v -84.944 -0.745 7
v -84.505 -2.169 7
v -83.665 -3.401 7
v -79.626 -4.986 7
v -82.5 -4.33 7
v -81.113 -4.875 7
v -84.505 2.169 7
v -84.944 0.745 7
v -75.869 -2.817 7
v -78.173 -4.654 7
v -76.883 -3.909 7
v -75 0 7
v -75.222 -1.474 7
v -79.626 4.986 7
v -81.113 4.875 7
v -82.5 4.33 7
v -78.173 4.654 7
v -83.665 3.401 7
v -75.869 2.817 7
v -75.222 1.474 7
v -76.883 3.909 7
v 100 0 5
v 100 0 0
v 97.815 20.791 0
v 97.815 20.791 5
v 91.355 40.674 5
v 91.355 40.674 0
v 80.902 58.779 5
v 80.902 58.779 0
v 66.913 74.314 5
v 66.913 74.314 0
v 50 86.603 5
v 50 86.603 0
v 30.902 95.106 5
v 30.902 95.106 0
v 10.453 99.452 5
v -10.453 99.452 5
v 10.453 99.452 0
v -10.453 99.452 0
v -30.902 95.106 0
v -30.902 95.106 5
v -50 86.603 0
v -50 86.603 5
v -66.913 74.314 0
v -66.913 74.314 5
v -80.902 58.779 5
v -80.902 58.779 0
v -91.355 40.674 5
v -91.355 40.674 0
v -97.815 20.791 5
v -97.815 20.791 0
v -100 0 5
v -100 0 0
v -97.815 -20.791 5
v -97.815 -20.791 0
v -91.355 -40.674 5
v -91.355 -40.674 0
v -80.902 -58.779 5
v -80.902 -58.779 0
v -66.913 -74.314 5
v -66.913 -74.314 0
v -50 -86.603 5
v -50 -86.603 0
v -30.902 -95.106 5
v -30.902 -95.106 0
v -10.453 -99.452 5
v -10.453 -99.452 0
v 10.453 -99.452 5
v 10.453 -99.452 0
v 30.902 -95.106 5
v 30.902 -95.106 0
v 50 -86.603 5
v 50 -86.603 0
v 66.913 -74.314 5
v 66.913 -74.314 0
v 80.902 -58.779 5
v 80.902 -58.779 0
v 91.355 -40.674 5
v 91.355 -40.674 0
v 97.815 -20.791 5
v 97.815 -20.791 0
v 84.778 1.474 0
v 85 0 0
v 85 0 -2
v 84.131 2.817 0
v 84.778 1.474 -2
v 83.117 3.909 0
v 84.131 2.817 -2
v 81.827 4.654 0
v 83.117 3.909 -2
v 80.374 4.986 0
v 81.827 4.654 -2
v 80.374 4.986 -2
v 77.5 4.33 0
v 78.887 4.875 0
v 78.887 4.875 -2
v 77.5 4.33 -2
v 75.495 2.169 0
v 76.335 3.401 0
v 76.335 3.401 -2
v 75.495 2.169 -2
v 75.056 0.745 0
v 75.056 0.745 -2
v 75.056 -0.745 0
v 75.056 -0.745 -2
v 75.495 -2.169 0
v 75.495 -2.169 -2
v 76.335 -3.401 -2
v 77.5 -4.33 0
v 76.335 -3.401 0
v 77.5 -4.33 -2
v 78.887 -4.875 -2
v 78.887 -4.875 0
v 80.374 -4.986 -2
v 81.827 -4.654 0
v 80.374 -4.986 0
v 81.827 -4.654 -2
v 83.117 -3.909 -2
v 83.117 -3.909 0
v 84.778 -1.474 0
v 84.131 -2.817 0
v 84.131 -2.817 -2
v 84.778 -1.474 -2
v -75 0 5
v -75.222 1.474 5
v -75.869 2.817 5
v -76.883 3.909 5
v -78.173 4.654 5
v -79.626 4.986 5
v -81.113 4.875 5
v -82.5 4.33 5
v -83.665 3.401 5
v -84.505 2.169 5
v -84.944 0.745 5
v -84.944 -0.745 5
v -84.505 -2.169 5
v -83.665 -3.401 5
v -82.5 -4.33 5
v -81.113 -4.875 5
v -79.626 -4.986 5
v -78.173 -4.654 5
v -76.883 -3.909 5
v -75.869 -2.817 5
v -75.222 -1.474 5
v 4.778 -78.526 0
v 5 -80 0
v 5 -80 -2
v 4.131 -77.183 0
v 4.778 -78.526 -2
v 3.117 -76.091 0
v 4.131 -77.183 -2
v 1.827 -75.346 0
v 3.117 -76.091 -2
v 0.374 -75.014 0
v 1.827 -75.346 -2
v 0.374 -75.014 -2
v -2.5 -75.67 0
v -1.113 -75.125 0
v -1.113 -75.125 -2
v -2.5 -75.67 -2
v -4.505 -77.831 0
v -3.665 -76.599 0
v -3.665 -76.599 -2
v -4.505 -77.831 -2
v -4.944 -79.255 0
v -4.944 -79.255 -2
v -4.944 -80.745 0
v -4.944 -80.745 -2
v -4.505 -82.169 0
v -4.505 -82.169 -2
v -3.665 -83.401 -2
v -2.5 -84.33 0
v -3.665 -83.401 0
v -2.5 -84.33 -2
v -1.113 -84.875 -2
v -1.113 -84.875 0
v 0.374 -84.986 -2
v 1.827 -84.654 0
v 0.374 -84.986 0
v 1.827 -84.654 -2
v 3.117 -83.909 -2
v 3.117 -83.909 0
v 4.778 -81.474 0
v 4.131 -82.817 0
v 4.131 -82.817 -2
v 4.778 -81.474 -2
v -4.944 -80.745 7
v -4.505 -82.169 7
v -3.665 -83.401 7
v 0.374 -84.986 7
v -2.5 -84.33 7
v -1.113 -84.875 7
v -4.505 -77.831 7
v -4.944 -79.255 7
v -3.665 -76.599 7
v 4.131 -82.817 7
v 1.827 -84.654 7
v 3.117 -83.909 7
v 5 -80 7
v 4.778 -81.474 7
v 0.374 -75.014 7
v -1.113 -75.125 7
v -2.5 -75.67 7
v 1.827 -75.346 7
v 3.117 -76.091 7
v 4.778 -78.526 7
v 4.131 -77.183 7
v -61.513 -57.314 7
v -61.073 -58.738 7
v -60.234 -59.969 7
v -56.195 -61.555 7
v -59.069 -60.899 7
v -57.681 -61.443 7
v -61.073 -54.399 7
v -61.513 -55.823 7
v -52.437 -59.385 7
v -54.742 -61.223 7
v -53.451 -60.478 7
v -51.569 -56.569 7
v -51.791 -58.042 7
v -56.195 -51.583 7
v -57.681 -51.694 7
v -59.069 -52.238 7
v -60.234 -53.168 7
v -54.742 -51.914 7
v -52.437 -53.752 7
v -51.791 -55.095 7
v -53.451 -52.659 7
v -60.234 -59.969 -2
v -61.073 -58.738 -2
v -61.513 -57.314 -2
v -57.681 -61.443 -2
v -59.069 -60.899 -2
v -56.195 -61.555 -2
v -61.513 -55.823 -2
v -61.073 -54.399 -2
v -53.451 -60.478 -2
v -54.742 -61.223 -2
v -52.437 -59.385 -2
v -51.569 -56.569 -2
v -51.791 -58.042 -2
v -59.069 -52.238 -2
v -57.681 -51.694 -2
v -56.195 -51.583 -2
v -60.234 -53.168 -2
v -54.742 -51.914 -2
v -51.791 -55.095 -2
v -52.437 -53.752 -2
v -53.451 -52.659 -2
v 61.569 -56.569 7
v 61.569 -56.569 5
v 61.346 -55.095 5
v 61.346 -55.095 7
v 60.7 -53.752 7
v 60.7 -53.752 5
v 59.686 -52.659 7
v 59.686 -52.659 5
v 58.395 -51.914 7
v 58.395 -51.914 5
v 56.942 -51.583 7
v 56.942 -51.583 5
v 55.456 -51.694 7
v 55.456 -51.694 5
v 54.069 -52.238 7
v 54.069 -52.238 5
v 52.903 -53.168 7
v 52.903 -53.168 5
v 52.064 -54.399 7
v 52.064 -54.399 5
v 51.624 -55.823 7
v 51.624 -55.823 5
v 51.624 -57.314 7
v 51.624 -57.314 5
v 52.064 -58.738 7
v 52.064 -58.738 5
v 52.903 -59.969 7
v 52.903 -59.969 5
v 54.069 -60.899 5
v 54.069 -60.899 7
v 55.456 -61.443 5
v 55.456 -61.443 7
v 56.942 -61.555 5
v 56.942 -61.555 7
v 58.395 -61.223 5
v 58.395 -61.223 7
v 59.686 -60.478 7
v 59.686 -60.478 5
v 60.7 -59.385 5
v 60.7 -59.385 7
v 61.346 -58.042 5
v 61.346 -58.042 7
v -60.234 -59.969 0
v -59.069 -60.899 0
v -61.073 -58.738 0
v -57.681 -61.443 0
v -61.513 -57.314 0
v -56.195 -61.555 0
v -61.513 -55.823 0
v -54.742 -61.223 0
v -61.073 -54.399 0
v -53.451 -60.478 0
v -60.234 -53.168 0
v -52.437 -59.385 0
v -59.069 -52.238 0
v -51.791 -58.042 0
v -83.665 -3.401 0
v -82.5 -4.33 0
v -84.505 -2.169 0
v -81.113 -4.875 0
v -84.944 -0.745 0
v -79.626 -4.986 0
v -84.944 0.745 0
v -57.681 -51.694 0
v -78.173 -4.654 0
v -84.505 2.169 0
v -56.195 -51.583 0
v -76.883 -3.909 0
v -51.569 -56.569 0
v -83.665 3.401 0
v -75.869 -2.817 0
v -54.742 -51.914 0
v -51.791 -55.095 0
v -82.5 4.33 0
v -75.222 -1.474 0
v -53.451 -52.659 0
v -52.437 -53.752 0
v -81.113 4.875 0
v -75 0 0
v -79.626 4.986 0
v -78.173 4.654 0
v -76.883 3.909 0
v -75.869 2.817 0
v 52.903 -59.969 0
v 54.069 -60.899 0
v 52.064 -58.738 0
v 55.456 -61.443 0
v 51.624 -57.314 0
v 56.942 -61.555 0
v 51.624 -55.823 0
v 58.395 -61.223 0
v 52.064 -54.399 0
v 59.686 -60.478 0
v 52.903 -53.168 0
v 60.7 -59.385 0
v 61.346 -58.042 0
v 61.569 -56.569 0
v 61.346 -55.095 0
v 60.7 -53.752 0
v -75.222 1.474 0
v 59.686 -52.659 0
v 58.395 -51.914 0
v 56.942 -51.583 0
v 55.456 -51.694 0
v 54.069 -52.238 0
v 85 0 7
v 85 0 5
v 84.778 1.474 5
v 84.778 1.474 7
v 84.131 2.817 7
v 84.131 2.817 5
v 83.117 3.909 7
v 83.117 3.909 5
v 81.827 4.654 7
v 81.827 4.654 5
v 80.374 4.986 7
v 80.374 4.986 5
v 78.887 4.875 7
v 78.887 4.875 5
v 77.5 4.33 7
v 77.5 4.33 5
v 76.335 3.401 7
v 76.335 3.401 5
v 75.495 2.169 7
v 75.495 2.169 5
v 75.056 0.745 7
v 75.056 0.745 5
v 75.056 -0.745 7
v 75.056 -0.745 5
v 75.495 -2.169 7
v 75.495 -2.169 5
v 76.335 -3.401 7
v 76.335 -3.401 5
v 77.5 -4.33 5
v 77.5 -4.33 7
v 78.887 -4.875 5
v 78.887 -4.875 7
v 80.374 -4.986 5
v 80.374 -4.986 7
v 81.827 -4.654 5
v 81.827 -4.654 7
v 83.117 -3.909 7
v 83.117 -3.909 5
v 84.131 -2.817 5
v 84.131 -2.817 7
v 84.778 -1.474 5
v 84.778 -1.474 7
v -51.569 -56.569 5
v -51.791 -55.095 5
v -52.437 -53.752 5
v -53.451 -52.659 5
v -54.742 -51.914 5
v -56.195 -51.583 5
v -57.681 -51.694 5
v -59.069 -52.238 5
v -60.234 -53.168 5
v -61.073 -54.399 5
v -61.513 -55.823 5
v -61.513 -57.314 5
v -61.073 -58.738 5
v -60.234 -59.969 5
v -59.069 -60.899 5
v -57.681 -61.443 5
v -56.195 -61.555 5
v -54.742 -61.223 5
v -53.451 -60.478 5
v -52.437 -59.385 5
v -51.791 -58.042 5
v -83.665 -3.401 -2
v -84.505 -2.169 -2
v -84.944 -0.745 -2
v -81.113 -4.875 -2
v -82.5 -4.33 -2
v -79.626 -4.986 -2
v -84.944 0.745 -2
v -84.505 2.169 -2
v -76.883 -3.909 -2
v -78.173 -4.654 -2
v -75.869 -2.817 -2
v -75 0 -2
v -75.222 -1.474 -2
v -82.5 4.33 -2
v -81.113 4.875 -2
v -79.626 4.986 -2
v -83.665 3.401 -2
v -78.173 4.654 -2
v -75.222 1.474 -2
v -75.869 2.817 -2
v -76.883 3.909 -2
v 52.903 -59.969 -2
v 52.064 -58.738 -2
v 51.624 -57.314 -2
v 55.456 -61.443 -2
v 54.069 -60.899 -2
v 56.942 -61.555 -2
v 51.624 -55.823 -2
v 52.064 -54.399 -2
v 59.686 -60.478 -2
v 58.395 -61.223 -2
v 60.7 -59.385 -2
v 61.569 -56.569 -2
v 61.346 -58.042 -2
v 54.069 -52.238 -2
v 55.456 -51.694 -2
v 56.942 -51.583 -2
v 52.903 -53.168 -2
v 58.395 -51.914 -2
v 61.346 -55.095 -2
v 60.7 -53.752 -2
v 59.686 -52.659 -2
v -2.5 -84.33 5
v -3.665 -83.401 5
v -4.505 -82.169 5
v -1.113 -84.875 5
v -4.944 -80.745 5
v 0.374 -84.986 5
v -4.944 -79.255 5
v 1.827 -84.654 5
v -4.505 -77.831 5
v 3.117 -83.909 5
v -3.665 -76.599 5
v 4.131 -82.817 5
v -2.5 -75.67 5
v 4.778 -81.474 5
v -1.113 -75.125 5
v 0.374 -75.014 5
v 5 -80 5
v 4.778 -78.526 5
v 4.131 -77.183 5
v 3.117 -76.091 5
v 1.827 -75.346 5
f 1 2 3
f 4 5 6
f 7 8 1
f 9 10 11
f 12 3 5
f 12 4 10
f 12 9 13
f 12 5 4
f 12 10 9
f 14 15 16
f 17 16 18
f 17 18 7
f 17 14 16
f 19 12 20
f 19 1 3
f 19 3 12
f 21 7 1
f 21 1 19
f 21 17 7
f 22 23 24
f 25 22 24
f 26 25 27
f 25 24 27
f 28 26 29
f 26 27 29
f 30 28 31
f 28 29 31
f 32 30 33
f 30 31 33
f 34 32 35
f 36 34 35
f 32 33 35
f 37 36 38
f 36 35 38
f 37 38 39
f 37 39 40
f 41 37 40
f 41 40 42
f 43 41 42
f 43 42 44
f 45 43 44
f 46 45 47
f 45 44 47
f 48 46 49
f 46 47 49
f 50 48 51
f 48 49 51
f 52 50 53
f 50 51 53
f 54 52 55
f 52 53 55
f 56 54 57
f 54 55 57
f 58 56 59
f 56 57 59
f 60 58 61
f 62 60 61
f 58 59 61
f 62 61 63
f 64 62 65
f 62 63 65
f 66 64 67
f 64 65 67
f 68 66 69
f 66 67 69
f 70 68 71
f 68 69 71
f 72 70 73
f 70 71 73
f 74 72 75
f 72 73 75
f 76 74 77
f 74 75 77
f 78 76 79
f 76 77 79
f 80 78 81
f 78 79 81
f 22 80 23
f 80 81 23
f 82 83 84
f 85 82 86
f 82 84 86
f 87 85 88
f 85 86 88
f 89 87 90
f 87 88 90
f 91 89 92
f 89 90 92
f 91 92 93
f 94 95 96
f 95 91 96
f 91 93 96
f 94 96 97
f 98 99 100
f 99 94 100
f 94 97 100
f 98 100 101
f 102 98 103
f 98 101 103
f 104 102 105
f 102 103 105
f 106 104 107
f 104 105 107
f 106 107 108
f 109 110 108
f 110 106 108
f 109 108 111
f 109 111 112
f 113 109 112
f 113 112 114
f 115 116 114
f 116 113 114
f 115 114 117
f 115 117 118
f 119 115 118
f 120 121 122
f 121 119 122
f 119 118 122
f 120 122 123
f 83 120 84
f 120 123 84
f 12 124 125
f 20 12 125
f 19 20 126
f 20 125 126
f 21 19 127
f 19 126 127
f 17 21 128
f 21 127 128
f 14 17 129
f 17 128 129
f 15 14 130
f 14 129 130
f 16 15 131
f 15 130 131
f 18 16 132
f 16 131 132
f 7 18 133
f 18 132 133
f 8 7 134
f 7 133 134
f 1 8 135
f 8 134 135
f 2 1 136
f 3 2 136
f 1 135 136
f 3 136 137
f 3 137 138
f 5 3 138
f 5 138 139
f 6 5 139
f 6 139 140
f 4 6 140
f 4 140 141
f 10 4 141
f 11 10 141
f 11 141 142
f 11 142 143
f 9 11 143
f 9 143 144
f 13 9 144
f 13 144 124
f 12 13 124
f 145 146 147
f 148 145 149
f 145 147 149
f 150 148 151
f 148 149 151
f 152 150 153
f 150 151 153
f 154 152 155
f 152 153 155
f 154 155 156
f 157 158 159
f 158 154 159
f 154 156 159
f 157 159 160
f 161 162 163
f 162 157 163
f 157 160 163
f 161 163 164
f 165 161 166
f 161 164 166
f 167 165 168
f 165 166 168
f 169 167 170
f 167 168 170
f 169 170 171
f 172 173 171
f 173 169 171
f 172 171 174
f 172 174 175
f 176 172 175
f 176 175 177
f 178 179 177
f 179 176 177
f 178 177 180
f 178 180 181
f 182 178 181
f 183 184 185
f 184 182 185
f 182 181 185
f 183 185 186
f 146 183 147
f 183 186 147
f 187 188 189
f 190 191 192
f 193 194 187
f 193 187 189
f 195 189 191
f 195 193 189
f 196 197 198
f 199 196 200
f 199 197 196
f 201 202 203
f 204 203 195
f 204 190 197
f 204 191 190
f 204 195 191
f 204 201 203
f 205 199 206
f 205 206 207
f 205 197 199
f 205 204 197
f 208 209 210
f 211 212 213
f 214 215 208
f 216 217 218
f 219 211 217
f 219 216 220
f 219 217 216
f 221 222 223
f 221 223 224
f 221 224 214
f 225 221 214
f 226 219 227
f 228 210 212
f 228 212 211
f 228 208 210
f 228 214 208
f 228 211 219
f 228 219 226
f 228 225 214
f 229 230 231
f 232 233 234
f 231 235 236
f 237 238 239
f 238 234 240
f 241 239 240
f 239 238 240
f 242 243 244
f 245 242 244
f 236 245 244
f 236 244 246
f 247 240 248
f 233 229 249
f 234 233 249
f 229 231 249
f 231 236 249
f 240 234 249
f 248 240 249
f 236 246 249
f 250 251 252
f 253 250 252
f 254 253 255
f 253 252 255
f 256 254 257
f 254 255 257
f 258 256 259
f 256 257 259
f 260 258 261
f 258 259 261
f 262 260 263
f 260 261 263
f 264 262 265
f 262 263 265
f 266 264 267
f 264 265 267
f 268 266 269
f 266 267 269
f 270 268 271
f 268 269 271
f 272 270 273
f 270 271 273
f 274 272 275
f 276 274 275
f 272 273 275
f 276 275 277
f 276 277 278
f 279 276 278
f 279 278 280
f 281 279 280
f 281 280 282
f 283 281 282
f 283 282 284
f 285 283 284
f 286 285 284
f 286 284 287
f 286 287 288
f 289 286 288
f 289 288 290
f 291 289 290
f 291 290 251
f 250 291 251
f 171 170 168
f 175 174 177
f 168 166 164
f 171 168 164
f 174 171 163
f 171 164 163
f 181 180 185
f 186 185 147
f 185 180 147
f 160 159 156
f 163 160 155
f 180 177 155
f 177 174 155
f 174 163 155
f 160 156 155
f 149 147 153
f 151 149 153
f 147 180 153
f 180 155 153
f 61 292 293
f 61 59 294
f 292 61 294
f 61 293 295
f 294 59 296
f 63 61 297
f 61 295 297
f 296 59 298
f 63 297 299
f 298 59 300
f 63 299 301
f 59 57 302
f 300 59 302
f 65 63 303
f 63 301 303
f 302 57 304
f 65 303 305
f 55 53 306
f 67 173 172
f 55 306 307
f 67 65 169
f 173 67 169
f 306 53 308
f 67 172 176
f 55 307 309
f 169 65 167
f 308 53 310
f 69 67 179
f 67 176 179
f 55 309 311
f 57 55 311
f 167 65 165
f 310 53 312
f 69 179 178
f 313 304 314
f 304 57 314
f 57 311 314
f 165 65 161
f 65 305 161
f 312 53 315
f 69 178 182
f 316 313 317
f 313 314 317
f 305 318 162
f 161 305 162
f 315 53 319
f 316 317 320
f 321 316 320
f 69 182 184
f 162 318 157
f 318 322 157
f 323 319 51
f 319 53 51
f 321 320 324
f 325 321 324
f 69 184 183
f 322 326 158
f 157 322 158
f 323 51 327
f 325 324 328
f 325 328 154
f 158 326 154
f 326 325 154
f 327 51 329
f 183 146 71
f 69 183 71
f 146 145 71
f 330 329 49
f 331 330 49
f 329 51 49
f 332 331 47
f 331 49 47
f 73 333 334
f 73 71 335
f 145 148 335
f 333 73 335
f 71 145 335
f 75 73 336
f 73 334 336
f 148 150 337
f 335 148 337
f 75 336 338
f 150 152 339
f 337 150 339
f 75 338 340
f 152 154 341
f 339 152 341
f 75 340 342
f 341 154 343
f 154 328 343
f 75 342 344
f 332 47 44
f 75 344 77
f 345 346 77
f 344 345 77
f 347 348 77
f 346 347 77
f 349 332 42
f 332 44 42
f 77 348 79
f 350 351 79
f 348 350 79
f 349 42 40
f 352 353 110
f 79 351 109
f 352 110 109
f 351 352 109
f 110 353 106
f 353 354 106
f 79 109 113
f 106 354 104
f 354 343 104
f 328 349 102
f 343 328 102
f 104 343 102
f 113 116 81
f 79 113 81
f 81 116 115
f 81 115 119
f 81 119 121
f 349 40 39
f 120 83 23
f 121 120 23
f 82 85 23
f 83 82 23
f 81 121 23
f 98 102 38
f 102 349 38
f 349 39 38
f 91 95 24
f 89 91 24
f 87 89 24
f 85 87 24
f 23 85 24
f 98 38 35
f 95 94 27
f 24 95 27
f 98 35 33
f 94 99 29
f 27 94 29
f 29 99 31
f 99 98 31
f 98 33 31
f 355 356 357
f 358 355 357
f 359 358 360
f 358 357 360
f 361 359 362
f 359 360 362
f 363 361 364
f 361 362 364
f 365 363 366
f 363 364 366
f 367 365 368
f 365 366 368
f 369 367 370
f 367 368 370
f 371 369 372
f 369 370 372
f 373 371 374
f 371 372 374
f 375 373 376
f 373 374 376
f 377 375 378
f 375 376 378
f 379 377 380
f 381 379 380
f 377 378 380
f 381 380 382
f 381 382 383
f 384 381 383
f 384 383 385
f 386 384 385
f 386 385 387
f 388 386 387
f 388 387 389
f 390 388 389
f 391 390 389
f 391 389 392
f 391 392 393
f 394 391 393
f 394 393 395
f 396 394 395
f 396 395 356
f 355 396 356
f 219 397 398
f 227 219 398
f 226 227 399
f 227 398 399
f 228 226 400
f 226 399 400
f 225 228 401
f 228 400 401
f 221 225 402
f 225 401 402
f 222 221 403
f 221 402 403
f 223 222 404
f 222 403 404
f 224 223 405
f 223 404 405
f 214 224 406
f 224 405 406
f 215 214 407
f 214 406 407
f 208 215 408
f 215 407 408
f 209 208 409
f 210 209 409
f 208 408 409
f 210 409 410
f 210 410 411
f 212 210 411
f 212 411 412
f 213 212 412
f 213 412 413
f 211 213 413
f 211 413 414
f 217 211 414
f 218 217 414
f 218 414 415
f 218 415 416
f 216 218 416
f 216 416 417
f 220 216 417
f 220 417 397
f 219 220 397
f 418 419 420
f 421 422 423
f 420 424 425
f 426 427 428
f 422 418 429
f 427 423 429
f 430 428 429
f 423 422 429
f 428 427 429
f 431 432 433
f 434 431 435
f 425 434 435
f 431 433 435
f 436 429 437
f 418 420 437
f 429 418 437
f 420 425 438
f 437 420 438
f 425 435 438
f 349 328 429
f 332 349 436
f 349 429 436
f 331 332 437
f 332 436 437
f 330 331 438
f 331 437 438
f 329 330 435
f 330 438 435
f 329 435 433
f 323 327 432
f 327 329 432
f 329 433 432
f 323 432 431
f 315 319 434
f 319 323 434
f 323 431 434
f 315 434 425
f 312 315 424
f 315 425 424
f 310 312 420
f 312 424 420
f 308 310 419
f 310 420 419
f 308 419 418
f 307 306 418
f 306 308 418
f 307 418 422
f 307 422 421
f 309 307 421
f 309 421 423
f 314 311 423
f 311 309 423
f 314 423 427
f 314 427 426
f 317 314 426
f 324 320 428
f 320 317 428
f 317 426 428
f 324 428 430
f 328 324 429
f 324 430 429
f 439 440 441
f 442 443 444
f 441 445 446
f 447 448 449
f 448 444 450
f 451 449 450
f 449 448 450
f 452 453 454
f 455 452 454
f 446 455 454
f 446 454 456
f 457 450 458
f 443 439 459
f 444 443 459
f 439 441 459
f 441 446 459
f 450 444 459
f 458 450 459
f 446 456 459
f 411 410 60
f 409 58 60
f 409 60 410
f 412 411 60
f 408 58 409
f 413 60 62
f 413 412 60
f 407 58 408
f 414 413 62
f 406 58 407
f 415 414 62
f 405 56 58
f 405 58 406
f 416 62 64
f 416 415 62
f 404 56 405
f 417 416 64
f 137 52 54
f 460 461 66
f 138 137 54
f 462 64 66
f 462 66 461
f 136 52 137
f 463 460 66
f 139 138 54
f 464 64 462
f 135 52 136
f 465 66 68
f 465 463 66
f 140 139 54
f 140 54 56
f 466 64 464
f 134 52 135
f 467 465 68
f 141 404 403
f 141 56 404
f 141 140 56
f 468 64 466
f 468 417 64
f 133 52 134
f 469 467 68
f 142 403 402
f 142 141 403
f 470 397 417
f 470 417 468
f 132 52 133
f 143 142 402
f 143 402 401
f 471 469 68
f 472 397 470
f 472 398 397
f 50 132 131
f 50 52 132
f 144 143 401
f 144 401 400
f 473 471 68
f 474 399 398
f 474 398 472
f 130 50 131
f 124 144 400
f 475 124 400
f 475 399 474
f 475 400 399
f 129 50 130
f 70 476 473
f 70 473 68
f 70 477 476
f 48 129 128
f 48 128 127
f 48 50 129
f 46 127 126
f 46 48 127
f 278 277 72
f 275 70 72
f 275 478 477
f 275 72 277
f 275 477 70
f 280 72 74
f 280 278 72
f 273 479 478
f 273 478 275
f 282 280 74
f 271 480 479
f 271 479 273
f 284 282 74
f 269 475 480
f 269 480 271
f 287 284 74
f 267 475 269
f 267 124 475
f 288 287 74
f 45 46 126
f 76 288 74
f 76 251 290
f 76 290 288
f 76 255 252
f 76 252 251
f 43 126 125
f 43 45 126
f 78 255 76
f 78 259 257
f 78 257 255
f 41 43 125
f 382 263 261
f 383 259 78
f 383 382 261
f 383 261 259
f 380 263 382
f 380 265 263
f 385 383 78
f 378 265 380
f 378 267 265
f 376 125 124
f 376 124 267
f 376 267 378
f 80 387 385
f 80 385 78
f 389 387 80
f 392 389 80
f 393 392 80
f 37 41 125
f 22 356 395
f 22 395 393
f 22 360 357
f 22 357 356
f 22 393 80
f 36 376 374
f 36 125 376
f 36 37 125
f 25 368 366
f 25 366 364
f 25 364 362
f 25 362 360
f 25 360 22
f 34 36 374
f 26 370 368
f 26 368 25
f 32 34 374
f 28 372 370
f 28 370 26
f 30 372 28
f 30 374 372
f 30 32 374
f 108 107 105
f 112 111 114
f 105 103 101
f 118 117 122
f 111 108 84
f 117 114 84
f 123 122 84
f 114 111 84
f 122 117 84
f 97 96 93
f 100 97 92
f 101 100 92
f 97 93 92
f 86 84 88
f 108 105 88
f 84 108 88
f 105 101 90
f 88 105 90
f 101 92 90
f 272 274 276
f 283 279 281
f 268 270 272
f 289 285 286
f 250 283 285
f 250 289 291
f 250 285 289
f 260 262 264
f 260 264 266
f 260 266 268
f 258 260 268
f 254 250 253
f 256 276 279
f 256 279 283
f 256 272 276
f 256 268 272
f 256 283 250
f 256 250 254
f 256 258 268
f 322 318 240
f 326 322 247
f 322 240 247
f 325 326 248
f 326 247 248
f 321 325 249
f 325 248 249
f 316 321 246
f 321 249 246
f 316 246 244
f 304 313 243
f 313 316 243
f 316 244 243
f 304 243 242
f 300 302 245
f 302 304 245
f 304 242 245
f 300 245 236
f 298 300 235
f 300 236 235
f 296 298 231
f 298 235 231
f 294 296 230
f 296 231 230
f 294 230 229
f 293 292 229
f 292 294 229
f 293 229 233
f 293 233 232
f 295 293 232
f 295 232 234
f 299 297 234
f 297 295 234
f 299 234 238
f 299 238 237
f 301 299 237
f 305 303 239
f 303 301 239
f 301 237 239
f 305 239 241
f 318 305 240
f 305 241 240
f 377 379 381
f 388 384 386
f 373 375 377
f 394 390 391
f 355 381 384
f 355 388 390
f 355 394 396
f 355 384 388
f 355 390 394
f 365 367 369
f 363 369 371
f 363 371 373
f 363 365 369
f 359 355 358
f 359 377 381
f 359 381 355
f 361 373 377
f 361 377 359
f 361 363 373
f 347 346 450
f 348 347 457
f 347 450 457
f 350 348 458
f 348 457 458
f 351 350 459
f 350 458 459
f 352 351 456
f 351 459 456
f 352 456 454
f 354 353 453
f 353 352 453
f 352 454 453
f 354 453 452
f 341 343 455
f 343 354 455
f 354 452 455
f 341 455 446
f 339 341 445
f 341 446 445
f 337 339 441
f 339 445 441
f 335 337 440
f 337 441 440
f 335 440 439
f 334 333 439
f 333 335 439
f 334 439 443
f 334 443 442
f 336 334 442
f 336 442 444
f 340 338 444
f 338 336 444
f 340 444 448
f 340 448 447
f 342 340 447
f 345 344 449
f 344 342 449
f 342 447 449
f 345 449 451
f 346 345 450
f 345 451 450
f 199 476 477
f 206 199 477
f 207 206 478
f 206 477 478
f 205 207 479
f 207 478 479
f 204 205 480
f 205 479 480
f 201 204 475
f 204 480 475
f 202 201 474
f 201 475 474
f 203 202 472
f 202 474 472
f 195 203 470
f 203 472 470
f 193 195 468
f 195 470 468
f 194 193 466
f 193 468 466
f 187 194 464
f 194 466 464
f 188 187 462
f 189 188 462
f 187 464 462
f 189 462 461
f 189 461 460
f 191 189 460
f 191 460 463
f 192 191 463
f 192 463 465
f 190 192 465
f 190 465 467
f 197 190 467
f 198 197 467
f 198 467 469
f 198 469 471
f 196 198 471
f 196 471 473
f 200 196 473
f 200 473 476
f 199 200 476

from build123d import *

# Parameters (mm, degrees)
SKETCH_1_R           = 100
EXTRUDE_1_DEPTH      = 5
EXTRUDE_2_DEPTH      = 2
EXTRUDE_2_DEPTH_BACK = 7
SKETCH_2_R           = 5


with BuildPart() as part:
    # Эскиз1 → Бобышка-Вытянуть1 (new body)
    with BuildSketch(Plane.XY):
        Circle(SKETCH_1_R)
    extrude(amount=EXTRUDE_1_DEPTH)

    # Эскиз2 → Бобышка-Вытянуть2 (add, two sides: drawn at the far end of the back side and taken through both)
    with BuildSketch(Plane.XY.offset(5).offset(-EXTRUDE_2_DEPTH_BACK)):
        with Locations((-80, 0)):
            Circle(SKETCH_2_R)
        with Locations((-56.568542495, -56.568542495)):
            Circle(SKETCH_2_R)
        with Locations((0, -80)):
            Circle(SKETCH_2_R)
        with Locations((56.568542495, -56.568542495)):
            Circle(SKETCH_2_R)
        with Locations((80, 0)):
            Circle(SKETCH_2_R)
    extrude(amount=EXTRUDE_2_DEPTH + EXTRUDE_2_DEPTH_BACK)


solid = part.part
